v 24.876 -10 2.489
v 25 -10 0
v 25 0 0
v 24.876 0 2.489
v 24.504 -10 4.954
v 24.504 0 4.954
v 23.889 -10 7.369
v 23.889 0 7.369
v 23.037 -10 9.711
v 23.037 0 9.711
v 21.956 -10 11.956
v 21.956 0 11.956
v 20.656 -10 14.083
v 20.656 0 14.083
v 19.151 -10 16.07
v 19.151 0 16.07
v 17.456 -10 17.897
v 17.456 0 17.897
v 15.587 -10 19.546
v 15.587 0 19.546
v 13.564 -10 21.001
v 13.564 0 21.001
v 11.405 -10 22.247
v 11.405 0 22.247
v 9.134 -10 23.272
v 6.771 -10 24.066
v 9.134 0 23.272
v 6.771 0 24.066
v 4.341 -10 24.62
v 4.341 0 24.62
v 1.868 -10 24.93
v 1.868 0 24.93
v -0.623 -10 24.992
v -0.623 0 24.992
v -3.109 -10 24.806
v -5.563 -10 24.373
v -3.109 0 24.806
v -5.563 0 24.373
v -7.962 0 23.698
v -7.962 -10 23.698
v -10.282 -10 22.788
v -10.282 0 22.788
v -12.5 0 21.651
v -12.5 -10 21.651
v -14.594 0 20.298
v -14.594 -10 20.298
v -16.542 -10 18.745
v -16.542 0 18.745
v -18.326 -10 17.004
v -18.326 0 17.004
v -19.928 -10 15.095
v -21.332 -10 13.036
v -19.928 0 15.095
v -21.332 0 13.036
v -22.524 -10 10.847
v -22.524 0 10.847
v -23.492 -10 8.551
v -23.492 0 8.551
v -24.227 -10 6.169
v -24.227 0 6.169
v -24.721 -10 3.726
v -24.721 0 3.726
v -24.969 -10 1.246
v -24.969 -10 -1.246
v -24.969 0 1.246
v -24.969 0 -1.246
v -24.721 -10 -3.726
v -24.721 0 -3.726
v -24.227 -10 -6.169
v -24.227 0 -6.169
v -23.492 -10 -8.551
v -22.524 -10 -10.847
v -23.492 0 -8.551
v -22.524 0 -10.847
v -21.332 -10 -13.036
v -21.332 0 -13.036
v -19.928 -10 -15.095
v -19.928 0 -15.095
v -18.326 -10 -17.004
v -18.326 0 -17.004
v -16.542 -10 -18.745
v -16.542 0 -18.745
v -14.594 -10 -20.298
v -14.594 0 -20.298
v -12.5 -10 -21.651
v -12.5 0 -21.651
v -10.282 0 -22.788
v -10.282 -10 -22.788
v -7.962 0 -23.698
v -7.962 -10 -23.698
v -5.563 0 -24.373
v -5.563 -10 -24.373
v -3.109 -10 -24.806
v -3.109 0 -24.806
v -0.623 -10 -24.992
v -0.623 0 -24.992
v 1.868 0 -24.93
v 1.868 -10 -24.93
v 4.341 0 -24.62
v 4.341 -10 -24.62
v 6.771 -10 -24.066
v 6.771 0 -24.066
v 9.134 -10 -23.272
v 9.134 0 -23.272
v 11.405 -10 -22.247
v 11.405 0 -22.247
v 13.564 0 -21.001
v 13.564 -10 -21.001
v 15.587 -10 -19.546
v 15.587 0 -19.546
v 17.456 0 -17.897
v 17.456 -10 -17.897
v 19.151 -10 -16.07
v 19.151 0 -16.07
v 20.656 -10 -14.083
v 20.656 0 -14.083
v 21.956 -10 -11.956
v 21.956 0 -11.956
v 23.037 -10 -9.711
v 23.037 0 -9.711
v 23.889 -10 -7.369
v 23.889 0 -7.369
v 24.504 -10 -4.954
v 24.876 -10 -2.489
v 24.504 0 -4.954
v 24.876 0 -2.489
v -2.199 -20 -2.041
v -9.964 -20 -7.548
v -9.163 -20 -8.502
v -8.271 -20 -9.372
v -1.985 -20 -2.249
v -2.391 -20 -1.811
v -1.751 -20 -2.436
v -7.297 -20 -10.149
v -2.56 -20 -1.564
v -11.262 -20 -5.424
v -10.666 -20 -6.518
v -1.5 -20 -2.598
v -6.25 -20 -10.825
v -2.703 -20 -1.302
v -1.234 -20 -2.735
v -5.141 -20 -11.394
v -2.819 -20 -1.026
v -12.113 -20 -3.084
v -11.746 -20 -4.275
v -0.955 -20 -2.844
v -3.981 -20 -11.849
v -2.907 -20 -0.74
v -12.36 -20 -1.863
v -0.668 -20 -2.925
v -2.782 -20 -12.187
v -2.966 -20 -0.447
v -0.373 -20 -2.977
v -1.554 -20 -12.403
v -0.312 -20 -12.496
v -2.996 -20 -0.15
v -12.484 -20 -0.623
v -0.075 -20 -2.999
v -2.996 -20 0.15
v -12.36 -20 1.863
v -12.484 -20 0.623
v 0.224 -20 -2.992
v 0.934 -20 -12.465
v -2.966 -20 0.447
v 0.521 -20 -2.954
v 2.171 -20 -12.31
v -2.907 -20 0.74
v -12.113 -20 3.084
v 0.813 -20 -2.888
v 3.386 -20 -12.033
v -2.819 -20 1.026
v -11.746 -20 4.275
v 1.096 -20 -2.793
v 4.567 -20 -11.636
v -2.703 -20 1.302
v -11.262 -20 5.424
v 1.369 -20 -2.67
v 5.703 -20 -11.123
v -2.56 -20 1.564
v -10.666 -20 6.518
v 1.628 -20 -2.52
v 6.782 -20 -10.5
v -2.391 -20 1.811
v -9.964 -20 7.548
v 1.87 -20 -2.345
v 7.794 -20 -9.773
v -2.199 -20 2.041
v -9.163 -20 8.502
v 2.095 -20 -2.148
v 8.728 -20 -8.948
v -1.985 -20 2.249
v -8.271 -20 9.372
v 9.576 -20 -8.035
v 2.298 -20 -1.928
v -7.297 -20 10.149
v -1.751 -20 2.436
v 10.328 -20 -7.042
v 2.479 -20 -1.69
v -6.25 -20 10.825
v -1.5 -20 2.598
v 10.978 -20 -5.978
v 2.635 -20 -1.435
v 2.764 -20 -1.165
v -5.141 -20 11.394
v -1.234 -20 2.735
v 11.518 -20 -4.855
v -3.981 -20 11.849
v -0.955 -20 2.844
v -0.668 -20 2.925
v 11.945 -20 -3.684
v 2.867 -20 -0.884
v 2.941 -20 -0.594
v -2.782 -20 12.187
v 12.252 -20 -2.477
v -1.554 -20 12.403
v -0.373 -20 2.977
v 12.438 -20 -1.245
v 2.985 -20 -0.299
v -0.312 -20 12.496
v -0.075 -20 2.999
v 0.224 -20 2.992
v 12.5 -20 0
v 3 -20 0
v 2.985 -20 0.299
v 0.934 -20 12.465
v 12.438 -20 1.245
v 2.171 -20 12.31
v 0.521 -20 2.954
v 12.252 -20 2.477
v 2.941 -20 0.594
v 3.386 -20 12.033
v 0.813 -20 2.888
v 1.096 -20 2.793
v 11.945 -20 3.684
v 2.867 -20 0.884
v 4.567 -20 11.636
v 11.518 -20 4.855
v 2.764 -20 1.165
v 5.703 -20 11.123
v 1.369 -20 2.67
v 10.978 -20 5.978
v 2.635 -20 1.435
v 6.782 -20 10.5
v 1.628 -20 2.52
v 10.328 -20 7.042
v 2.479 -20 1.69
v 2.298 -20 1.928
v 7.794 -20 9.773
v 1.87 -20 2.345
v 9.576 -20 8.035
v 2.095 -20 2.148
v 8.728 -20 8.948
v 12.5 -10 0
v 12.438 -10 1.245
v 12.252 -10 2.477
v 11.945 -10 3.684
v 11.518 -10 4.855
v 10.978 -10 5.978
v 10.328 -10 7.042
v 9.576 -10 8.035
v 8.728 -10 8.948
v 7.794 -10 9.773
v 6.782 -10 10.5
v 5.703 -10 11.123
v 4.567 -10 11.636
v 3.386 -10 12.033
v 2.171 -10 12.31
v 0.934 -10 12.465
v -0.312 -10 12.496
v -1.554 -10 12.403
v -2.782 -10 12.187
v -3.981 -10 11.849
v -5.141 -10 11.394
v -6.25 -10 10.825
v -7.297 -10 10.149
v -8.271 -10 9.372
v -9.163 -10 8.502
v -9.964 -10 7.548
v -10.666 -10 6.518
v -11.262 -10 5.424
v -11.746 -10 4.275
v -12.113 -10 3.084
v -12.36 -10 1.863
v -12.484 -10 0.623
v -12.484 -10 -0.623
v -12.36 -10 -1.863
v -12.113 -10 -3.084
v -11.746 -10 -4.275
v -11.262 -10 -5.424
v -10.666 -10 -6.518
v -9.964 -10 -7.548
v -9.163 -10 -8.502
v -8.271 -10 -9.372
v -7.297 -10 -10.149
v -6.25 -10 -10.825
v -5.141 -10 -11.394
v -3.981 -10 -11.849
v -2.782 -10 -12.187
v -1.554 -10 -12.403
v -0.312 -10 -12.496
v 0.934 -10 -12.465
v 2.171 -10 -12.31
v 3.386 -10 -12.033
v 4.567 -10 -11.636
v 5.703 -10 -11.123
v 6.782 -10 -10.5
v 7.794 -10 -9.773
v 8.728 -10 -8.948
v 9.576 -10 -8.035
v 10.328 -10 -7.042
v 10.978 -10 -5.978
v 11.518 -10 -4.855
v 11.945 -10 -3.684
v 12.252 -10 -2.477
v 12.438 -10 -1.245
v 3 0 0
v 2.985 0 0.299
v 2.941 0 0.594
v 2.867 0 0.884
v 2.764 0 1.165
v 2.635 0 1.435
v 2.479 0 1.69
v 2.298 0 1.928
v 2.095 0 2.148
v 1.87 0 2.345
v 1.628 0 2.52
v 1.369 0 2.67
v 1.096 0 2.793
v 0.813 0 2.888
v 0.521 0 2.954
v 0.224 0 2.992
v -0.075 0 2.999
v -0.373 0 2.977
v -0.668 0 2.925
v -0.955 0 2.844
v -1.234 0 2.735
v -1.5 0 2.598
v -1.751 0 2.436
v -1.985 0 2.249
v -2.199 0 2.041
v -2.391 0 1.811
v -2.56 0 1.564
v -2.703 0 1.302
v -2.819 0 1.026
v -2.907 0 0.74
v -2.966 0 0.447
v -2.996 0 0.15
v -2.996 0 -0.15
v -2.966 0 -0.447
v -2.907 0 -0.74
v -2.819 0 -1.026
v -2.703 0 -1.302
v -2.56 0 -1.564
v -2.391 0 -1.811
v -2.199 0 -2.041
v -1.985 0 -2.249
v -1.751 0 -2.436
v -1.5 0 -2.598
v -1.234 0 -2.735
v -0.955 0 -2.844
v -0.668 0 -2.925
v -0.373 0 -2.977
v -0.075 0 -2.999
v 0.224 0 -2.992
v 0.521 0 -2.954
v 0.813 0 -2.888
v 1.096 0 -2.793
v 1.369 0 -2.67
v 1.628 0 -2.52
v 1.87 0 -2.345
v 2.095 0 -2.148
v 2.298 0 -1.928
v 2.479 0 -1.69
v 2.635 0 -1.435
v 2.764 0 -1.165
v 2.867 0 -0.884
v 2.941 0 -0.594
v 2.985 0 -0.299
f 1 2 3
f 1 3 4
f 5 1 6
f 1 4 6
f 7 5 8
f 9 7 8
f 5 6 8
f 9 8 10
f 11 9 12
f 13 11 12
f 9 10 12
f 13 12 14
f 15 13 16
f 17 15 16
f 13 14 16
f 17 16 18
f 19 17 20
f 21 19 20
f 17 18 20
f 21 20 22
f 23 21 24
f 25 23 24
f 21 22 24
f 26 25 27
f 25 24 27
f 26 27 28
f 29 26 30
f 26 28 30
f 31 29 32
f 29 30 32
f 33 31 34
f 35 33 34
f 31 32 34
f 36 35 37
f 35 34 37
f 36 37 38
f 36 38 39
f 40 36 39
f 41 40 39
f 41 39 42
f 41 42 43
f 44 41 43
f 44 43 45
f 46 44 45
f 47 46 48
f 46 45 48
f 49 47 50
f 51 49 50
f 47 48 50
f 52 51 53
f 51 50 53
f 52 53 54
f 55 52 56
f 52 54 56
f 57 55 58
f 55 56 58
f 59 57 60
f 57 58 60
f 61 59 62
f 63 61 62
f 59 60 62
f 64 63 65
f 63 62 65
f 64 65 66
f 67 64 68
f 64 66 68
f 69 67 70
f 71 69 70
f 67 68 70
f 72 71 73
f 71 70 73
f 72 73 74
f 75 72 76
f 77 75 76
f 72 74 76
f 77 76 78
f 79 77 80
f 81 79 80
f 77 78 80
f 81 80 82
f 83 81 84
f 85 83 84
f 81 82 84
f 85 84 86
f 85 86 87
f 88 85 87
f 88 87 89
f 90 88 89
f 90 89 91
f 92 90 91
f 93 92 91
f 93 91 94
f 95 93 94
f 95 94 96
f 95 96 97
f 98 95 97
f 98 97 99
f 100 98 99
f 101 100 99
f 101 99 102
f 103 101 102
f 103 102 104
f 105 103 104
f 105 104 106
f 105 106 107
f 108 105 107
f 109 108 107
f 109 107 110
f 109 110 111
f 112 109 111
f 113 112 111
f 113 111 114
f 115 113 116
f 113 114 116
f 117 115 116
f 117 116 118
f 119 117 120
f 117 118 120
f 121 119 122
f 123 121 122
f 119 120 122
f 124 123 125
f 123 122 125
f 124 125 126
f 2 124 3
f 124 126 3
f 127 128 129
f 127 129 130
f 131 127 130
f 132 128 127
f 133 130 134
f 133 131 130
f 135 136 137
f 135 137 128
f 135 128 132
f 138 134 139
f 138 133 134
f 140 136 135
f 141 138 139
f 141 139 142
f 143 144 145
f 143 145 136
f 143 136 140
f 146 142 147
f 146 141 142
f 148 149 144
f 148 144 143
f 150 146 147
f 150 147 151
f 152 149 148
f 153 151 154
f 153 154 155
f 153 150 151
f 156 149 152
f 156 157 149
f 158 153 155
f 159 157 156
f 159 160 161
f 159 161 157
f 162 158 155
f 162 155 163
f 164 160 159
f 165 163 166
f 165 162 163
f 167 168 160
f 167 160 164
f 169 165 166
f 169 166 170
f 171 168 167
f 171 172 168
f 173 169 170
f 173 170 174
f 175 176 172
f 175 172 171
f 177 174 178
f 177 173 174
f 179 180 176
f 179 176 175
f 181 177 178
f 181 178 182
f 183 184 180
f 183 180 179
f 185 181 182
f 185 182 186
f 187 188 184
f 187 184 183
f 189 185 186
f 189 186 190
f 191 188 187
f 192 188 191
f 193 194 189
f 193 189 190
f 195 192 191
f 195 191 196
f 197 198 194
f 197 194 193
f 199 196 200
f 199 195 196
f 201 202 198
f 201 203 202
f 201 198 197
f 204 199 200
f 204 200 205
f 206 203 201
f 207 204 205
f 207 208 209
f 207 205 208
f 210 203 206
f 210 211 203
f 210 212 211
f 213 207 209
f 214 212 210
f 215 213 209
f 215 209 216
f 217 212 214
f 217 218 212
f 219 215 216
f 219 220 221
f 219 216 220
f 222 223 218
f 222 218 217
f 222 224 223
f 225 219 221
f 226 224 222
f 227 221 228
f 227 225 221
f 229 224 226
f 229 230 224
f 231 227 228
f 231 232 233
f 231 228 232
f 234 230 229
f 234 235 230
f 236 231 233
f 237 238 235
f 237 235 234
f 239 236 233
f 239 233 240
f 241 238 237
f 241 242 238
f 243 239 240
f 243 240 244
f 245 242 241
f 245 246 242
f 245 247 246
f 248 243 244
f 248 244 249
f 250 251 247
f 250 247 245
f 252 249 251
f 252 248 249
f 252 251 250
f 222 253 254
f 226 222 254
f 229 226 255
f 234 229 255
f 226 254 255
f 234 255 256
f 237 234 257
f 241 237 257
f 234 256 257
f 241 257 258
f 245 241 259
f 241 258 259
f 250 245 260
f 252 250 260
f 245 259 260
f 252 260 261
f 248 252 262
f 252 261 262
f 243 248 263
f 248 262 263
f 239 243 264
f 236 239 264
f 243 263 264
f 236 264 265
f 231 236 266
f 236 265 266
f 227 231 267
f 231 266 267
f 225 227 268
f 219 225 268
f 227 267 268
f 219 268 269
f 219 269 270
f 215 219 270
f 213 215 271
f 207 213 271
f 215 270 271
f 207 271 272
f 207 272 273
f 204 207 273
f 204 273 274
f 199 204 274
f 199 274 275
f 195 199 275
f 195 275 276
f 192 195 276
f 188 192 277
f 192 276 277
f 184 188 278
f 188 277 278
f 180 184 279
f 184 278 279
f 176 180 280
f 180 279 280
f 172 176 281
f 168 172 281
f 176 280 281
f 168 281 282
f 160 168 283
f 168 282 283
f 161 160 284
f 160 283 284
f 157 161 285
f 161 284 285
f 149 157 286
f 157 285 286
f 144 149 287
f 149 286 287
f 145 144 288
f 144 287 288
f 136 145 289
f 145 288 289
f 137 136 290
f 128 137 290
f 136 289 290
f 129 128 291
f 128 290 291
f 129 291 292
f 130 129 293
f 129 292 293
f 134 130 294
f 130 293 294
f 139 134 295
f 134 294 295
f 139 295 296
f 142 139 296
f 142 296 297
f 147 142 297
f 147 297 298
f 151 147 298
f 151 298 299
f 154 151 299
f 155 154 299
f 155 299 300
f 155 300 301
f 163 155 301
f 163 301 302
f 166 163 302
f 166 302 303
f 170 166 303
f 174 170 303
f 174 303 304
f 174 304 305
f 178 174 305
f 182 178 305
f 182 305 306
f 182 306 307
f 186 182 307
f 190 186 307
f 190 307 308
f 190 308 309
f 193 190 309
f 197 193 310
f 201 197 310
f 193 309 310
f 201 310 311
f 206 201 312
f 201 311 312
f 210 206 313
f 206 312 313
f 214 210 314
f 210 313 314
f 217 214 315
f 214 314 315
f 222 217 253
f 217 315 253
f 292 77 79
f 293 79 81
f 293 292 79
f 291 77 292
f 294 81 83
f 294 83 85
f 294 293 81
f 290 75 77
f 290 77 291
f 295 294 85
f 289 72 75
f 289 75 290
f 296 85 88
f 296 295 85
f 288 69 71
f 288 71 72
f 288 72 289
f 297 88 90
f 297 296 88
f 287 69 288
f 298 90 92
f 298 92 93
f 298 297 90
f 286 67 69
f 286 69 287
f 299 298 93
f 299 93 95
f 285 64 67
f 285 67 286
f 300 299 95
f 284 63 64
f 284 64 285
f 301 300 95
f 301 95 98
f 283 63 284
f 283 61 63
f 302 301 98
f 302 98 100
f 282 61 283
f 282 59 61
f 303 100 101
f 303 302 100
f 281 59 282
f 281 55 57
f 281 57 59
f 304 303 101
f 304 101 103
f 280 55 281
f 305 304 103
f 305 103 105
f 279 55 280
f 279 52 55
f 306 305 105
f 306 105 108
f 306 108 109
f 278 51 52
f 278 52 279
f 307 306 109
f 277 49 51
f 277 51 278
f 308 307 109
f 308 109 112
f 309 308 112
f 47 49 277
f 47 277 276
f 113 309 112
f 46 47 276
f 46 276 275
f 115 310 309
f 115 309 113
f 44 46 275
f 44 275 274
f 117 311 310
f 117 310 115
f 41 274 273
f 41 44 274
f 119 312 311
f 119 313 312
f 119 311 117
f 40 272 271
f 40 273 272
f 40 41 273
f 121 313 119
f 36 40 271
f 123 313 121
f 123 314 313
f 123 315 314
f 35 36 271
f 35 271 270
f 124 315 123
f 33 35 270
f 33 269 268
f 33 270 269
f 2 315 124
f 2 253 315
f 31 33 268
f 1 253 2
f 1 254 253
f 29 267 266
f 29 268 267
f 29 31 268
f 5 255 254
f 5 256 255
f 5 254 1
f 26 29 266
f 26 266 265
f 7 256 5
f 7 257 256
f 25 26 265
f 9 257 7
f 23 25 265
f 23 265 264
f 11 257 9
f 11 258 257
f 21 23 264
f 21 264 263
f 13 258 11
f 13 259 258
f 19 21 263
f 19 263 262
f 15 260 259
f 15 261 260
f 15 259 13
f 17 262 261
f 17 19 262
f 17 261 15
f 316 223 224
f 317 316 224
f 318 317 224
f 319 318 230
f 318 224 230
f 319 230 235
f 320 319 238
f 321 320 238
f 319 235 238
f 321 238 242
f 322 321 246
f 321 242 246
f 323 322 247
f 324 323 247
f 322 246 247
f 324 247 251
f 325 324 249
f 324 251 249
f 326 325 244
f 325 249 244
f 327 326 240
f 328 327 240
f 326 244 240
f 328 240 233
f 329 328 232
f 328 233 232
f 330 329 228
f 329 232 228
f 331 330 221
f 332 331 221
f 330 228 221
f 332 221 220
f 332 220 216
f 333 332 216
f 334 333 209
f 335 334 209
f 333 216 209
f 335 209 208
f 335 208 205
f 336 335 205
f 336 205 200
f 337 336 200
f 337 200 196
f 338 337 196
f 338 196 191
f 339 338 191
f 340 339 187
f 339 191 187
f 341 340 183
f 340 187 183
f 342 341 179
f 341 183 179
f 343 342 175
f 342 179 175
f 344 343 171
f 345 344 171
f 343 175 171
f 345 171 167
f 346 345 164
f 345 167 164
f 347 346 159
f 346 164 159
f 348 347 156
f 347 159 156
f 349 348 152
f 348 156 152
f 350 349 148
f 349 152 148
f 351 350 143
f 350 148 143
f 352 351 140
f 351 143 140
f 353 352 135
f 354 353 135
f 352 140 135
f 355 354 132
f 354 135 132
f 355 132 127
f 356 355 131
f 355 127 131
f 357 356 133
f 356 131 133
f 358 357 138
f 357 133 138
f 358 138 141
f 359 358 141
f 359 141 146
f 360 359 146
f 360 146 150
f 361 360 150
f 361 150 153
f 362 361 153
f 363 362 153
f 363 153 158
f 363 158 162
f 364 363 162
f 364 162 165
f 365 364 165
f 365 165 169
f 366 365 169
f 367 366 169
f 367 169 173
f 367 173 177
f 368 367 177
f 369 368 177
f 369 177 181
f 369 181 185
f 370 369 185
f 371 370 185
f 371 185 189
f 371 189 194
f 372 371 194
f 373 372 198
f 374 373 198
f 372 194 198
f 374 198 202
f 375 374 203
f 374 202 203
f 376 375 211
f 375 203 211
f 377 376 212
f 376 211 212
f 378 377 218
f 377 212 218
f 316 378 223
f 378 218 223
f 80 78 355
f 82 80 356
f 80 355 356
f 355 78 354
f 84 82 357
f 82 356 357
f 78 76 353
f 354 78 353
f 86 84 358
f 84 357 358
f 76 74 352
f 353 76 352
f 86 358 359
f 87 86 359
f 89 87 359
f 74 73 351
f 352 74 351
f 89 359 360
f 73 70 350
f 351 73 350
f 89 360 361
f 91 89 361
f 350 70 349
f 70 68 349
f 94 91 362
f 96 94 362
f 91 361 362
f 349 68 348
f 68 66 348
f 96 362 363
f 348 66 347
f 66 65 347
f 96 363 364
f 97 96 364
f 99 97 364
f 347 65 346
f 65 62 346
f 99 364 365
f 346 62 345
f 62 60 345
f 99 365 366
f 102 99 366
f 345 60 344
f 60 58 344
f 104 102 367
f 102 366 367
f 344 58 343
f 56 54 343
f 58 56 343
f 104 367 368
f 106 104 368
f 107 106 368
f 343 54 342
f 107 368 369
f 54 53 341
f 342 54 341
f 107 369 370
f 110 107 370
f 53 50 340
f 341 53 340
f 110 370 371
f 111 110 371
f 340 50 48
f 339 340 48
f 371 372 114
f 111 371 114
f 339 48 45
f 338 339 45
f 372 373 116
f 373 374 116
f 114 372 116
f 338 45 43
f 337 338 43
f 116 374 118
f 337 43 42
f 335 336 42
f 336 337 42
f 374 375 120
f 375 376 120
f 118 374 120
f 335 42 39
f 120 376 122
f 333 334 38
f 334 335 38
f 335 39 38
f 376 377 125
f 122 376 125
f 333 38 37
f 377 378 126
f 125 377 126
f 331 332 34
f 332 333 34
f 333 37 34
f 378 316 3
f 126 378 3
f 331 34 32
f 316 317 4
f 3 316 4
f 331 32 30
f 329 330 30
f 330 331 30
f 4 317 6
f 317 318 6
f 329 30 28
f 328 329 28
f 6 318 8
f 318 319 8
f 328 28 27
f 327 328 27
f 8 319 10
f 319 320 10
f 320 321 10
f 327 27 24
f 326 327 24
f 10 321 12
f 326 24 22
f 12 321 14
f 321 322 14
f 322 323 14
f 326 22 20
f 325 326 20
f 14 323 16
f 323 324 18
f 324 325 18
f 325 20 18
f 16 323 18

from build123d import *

# Parameters (mm, degrees)
SKETCH_R     = 25
PAD_DEPTH    = 10
SKETCH001_R  = 12.5
PAD001_DEPTH = 10
SKETCH002_R  = 3
POCKET_DEPTH = 20


with BuildPart() as part:
    # Sketch → Pad (new body)
    with BuildSketch(Plane.XZ):
        Circle(SKETCH_R)
    extrude(amount=PAD_DEPTH)

    # Sketch001 (on Face3 of Pad) → Pad001 (join)
    with BuildSketch(Plane.XZ.offset(10)):
        Circle(SKETCH001_R)
    extrude(amount=PAD001_DEPTH)

    # Sketch002 (on Face5 of Pad001) → Pocket (cut)
    with BuildSketch(Plane.XZ.offset(20)):
        Circle(SKETCH002_R)
    extrude(amount=-POCKET_DEPTH, mode=Mode.SUBTRACT)


solid = part.part
